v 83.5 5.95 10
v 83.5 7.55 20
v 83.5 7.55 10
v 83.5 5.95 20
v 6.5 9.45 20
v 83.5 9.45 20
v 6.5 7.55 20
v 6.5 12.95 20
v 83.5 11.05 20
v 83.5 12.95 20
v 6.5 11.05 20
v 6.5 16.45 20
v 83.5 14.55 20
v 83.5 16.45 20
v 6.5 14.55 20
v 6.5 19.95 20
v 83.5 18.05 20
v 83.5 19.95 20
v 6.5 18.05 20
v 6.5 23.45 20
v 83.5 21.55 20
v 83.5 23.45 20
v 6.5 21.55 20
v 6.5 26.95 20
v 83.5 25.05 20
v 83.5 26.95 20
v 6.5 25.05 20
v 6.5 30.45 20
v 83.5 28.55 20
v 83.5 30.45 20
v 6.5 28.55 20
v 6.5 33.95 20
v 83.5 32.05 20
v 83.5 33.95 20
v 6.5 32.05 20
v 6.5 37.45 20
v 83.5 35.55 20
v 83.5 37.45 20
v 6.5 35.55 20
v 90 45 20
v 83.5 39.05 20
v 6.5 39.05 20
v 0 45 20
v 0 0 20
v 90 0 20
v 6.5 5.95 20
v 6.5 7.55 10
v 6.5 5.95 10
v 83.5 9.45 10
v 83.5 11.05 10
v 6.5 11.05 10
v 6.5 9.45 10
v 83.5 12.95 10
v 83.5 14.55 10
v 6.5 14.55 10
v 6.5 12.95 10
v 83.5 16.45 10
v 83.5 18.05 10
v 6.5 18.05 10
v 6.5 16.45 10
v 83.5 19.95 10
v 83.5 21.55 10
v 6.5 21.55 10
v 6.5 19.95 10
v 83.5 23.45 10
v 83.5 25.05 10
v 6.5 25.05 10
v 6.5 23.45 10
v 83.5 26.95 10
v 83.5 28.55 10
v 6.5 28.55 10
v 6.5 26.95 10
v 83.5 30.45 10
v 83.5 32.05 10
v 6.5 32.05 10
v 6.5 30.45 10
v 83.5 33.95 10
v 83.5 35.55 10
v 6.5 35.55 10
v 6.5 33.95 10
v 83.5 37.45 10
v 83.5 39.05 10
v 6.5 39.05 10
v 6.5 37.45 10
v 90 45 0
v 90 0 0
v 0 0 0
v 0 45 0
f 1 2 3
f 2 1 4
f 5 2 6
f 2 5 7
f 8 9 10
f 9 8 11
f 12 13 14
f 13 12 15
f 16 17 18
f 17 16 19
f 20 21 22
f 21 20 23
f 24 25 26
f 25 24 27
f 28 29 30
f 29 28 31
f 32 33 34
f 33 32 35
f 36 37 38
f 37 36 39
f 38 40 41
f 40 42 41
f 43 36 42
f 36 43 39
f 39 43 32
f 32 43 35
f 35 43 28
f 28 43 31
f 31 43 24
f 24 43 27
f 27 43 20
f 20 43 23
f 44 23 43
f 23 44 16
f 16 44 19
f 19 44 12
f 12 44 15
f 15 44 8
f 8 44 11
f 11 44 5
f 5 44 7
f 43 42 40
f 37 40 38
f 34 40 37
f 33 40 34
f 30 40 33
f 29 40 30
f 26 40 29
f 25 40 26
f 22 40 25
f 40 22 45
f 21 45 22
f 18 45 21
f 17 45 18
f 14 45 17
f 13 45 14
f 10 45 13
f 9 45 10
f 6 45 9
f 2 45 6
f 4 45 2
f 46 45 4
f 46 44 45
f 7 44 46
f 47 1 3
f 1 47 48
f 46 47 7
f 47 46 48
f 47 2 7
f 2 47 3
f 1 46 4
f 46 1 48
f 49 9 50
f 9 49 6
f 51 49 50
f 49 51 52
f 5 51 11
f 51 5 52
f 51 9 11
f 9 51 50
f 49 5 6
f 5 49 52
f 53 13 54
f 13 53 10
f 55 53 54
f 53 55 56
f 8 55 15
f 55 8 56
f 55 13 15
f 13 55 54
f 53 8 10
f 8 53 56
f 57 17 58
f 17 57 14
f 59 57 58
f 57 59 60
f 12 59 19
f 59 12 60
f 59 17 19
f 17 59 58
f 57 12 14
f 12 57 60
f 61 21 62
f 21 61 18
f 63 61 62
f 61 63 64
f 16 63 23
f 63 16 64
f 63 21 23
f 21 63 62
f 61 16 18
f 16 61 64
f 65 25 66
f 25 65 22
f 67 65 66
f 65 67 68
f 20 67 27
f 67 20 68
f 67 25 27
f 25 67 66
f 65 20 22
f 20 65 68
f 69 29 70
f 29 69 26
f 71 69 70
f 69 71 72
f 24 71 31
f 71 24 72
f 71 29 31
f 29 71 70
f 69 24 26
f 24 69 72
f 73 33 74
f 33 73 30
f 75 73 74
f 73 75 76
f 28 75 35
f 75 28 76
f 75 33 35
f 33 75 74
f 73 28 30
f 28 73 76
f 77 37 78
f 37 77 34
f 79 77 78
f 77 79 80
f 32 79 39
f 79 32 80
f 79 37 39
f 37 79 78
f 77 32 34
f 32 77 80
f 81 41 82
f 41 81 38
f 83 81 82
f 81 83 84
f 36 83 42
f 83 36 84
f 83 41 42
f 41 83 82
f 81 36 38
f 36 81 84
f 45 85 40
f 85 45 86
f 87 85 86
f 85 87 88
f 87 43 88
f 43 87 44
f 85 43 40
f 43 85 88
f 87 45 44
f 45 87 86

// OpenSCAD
// Microscope slide drying rack - solid base with 10 parallel slots for standing slides.

// Base dimensions
L_base = 90;
W_base = 45;
H_base = 20;

// Slide dimensions (standard 75x25x1 mm)
slide_len = 75;
slide_w   = 25;
slide_thk = 1;

// Slot dimensions
slot_len = 77;
slot_w   = 1.6;
slot_deep = 10;

// Spacing
slot_spacing = 3.5;

// Derived positions
// Center the group of 10 slots in Y (total width = 9 * 3.5 + 1.6 = 34.1 mm)
// Center offset from origin: (45 - 34.1) / 2 = 5.45 mm
y_offset = (W_base - (9 * slot_spacing + slot_w)) / 2;

// Center the slots in X (slot length 77, base length 90)
// Center offset from origin: (90 - 77) / 2 = 6.5 mm
x_offset = (L_base - slot_len) / 2;

$fn = 64;

difference() {
    // Main solid block
    translate([0, 0, 0]) cube([L_base, W_base, H_base]);

    // Cut 10 slots
    for (i = [0 : 9]) {
        // Calculate Y position for this slot
        // i=0 is the first slot, i=9 is the last
        // Position = y_offset + i * slot_spacing
        y_pos = y_offset + i * slot_spacing;
        
        // Slot geometry: runs along X, centered at x_offset
        // Width is along Y, depth is along Z
        translate([x_offset, y_pos, H_base - slot_deep]) 
            cube([slot_len, slot_w, slot_deep]);
    }
}
